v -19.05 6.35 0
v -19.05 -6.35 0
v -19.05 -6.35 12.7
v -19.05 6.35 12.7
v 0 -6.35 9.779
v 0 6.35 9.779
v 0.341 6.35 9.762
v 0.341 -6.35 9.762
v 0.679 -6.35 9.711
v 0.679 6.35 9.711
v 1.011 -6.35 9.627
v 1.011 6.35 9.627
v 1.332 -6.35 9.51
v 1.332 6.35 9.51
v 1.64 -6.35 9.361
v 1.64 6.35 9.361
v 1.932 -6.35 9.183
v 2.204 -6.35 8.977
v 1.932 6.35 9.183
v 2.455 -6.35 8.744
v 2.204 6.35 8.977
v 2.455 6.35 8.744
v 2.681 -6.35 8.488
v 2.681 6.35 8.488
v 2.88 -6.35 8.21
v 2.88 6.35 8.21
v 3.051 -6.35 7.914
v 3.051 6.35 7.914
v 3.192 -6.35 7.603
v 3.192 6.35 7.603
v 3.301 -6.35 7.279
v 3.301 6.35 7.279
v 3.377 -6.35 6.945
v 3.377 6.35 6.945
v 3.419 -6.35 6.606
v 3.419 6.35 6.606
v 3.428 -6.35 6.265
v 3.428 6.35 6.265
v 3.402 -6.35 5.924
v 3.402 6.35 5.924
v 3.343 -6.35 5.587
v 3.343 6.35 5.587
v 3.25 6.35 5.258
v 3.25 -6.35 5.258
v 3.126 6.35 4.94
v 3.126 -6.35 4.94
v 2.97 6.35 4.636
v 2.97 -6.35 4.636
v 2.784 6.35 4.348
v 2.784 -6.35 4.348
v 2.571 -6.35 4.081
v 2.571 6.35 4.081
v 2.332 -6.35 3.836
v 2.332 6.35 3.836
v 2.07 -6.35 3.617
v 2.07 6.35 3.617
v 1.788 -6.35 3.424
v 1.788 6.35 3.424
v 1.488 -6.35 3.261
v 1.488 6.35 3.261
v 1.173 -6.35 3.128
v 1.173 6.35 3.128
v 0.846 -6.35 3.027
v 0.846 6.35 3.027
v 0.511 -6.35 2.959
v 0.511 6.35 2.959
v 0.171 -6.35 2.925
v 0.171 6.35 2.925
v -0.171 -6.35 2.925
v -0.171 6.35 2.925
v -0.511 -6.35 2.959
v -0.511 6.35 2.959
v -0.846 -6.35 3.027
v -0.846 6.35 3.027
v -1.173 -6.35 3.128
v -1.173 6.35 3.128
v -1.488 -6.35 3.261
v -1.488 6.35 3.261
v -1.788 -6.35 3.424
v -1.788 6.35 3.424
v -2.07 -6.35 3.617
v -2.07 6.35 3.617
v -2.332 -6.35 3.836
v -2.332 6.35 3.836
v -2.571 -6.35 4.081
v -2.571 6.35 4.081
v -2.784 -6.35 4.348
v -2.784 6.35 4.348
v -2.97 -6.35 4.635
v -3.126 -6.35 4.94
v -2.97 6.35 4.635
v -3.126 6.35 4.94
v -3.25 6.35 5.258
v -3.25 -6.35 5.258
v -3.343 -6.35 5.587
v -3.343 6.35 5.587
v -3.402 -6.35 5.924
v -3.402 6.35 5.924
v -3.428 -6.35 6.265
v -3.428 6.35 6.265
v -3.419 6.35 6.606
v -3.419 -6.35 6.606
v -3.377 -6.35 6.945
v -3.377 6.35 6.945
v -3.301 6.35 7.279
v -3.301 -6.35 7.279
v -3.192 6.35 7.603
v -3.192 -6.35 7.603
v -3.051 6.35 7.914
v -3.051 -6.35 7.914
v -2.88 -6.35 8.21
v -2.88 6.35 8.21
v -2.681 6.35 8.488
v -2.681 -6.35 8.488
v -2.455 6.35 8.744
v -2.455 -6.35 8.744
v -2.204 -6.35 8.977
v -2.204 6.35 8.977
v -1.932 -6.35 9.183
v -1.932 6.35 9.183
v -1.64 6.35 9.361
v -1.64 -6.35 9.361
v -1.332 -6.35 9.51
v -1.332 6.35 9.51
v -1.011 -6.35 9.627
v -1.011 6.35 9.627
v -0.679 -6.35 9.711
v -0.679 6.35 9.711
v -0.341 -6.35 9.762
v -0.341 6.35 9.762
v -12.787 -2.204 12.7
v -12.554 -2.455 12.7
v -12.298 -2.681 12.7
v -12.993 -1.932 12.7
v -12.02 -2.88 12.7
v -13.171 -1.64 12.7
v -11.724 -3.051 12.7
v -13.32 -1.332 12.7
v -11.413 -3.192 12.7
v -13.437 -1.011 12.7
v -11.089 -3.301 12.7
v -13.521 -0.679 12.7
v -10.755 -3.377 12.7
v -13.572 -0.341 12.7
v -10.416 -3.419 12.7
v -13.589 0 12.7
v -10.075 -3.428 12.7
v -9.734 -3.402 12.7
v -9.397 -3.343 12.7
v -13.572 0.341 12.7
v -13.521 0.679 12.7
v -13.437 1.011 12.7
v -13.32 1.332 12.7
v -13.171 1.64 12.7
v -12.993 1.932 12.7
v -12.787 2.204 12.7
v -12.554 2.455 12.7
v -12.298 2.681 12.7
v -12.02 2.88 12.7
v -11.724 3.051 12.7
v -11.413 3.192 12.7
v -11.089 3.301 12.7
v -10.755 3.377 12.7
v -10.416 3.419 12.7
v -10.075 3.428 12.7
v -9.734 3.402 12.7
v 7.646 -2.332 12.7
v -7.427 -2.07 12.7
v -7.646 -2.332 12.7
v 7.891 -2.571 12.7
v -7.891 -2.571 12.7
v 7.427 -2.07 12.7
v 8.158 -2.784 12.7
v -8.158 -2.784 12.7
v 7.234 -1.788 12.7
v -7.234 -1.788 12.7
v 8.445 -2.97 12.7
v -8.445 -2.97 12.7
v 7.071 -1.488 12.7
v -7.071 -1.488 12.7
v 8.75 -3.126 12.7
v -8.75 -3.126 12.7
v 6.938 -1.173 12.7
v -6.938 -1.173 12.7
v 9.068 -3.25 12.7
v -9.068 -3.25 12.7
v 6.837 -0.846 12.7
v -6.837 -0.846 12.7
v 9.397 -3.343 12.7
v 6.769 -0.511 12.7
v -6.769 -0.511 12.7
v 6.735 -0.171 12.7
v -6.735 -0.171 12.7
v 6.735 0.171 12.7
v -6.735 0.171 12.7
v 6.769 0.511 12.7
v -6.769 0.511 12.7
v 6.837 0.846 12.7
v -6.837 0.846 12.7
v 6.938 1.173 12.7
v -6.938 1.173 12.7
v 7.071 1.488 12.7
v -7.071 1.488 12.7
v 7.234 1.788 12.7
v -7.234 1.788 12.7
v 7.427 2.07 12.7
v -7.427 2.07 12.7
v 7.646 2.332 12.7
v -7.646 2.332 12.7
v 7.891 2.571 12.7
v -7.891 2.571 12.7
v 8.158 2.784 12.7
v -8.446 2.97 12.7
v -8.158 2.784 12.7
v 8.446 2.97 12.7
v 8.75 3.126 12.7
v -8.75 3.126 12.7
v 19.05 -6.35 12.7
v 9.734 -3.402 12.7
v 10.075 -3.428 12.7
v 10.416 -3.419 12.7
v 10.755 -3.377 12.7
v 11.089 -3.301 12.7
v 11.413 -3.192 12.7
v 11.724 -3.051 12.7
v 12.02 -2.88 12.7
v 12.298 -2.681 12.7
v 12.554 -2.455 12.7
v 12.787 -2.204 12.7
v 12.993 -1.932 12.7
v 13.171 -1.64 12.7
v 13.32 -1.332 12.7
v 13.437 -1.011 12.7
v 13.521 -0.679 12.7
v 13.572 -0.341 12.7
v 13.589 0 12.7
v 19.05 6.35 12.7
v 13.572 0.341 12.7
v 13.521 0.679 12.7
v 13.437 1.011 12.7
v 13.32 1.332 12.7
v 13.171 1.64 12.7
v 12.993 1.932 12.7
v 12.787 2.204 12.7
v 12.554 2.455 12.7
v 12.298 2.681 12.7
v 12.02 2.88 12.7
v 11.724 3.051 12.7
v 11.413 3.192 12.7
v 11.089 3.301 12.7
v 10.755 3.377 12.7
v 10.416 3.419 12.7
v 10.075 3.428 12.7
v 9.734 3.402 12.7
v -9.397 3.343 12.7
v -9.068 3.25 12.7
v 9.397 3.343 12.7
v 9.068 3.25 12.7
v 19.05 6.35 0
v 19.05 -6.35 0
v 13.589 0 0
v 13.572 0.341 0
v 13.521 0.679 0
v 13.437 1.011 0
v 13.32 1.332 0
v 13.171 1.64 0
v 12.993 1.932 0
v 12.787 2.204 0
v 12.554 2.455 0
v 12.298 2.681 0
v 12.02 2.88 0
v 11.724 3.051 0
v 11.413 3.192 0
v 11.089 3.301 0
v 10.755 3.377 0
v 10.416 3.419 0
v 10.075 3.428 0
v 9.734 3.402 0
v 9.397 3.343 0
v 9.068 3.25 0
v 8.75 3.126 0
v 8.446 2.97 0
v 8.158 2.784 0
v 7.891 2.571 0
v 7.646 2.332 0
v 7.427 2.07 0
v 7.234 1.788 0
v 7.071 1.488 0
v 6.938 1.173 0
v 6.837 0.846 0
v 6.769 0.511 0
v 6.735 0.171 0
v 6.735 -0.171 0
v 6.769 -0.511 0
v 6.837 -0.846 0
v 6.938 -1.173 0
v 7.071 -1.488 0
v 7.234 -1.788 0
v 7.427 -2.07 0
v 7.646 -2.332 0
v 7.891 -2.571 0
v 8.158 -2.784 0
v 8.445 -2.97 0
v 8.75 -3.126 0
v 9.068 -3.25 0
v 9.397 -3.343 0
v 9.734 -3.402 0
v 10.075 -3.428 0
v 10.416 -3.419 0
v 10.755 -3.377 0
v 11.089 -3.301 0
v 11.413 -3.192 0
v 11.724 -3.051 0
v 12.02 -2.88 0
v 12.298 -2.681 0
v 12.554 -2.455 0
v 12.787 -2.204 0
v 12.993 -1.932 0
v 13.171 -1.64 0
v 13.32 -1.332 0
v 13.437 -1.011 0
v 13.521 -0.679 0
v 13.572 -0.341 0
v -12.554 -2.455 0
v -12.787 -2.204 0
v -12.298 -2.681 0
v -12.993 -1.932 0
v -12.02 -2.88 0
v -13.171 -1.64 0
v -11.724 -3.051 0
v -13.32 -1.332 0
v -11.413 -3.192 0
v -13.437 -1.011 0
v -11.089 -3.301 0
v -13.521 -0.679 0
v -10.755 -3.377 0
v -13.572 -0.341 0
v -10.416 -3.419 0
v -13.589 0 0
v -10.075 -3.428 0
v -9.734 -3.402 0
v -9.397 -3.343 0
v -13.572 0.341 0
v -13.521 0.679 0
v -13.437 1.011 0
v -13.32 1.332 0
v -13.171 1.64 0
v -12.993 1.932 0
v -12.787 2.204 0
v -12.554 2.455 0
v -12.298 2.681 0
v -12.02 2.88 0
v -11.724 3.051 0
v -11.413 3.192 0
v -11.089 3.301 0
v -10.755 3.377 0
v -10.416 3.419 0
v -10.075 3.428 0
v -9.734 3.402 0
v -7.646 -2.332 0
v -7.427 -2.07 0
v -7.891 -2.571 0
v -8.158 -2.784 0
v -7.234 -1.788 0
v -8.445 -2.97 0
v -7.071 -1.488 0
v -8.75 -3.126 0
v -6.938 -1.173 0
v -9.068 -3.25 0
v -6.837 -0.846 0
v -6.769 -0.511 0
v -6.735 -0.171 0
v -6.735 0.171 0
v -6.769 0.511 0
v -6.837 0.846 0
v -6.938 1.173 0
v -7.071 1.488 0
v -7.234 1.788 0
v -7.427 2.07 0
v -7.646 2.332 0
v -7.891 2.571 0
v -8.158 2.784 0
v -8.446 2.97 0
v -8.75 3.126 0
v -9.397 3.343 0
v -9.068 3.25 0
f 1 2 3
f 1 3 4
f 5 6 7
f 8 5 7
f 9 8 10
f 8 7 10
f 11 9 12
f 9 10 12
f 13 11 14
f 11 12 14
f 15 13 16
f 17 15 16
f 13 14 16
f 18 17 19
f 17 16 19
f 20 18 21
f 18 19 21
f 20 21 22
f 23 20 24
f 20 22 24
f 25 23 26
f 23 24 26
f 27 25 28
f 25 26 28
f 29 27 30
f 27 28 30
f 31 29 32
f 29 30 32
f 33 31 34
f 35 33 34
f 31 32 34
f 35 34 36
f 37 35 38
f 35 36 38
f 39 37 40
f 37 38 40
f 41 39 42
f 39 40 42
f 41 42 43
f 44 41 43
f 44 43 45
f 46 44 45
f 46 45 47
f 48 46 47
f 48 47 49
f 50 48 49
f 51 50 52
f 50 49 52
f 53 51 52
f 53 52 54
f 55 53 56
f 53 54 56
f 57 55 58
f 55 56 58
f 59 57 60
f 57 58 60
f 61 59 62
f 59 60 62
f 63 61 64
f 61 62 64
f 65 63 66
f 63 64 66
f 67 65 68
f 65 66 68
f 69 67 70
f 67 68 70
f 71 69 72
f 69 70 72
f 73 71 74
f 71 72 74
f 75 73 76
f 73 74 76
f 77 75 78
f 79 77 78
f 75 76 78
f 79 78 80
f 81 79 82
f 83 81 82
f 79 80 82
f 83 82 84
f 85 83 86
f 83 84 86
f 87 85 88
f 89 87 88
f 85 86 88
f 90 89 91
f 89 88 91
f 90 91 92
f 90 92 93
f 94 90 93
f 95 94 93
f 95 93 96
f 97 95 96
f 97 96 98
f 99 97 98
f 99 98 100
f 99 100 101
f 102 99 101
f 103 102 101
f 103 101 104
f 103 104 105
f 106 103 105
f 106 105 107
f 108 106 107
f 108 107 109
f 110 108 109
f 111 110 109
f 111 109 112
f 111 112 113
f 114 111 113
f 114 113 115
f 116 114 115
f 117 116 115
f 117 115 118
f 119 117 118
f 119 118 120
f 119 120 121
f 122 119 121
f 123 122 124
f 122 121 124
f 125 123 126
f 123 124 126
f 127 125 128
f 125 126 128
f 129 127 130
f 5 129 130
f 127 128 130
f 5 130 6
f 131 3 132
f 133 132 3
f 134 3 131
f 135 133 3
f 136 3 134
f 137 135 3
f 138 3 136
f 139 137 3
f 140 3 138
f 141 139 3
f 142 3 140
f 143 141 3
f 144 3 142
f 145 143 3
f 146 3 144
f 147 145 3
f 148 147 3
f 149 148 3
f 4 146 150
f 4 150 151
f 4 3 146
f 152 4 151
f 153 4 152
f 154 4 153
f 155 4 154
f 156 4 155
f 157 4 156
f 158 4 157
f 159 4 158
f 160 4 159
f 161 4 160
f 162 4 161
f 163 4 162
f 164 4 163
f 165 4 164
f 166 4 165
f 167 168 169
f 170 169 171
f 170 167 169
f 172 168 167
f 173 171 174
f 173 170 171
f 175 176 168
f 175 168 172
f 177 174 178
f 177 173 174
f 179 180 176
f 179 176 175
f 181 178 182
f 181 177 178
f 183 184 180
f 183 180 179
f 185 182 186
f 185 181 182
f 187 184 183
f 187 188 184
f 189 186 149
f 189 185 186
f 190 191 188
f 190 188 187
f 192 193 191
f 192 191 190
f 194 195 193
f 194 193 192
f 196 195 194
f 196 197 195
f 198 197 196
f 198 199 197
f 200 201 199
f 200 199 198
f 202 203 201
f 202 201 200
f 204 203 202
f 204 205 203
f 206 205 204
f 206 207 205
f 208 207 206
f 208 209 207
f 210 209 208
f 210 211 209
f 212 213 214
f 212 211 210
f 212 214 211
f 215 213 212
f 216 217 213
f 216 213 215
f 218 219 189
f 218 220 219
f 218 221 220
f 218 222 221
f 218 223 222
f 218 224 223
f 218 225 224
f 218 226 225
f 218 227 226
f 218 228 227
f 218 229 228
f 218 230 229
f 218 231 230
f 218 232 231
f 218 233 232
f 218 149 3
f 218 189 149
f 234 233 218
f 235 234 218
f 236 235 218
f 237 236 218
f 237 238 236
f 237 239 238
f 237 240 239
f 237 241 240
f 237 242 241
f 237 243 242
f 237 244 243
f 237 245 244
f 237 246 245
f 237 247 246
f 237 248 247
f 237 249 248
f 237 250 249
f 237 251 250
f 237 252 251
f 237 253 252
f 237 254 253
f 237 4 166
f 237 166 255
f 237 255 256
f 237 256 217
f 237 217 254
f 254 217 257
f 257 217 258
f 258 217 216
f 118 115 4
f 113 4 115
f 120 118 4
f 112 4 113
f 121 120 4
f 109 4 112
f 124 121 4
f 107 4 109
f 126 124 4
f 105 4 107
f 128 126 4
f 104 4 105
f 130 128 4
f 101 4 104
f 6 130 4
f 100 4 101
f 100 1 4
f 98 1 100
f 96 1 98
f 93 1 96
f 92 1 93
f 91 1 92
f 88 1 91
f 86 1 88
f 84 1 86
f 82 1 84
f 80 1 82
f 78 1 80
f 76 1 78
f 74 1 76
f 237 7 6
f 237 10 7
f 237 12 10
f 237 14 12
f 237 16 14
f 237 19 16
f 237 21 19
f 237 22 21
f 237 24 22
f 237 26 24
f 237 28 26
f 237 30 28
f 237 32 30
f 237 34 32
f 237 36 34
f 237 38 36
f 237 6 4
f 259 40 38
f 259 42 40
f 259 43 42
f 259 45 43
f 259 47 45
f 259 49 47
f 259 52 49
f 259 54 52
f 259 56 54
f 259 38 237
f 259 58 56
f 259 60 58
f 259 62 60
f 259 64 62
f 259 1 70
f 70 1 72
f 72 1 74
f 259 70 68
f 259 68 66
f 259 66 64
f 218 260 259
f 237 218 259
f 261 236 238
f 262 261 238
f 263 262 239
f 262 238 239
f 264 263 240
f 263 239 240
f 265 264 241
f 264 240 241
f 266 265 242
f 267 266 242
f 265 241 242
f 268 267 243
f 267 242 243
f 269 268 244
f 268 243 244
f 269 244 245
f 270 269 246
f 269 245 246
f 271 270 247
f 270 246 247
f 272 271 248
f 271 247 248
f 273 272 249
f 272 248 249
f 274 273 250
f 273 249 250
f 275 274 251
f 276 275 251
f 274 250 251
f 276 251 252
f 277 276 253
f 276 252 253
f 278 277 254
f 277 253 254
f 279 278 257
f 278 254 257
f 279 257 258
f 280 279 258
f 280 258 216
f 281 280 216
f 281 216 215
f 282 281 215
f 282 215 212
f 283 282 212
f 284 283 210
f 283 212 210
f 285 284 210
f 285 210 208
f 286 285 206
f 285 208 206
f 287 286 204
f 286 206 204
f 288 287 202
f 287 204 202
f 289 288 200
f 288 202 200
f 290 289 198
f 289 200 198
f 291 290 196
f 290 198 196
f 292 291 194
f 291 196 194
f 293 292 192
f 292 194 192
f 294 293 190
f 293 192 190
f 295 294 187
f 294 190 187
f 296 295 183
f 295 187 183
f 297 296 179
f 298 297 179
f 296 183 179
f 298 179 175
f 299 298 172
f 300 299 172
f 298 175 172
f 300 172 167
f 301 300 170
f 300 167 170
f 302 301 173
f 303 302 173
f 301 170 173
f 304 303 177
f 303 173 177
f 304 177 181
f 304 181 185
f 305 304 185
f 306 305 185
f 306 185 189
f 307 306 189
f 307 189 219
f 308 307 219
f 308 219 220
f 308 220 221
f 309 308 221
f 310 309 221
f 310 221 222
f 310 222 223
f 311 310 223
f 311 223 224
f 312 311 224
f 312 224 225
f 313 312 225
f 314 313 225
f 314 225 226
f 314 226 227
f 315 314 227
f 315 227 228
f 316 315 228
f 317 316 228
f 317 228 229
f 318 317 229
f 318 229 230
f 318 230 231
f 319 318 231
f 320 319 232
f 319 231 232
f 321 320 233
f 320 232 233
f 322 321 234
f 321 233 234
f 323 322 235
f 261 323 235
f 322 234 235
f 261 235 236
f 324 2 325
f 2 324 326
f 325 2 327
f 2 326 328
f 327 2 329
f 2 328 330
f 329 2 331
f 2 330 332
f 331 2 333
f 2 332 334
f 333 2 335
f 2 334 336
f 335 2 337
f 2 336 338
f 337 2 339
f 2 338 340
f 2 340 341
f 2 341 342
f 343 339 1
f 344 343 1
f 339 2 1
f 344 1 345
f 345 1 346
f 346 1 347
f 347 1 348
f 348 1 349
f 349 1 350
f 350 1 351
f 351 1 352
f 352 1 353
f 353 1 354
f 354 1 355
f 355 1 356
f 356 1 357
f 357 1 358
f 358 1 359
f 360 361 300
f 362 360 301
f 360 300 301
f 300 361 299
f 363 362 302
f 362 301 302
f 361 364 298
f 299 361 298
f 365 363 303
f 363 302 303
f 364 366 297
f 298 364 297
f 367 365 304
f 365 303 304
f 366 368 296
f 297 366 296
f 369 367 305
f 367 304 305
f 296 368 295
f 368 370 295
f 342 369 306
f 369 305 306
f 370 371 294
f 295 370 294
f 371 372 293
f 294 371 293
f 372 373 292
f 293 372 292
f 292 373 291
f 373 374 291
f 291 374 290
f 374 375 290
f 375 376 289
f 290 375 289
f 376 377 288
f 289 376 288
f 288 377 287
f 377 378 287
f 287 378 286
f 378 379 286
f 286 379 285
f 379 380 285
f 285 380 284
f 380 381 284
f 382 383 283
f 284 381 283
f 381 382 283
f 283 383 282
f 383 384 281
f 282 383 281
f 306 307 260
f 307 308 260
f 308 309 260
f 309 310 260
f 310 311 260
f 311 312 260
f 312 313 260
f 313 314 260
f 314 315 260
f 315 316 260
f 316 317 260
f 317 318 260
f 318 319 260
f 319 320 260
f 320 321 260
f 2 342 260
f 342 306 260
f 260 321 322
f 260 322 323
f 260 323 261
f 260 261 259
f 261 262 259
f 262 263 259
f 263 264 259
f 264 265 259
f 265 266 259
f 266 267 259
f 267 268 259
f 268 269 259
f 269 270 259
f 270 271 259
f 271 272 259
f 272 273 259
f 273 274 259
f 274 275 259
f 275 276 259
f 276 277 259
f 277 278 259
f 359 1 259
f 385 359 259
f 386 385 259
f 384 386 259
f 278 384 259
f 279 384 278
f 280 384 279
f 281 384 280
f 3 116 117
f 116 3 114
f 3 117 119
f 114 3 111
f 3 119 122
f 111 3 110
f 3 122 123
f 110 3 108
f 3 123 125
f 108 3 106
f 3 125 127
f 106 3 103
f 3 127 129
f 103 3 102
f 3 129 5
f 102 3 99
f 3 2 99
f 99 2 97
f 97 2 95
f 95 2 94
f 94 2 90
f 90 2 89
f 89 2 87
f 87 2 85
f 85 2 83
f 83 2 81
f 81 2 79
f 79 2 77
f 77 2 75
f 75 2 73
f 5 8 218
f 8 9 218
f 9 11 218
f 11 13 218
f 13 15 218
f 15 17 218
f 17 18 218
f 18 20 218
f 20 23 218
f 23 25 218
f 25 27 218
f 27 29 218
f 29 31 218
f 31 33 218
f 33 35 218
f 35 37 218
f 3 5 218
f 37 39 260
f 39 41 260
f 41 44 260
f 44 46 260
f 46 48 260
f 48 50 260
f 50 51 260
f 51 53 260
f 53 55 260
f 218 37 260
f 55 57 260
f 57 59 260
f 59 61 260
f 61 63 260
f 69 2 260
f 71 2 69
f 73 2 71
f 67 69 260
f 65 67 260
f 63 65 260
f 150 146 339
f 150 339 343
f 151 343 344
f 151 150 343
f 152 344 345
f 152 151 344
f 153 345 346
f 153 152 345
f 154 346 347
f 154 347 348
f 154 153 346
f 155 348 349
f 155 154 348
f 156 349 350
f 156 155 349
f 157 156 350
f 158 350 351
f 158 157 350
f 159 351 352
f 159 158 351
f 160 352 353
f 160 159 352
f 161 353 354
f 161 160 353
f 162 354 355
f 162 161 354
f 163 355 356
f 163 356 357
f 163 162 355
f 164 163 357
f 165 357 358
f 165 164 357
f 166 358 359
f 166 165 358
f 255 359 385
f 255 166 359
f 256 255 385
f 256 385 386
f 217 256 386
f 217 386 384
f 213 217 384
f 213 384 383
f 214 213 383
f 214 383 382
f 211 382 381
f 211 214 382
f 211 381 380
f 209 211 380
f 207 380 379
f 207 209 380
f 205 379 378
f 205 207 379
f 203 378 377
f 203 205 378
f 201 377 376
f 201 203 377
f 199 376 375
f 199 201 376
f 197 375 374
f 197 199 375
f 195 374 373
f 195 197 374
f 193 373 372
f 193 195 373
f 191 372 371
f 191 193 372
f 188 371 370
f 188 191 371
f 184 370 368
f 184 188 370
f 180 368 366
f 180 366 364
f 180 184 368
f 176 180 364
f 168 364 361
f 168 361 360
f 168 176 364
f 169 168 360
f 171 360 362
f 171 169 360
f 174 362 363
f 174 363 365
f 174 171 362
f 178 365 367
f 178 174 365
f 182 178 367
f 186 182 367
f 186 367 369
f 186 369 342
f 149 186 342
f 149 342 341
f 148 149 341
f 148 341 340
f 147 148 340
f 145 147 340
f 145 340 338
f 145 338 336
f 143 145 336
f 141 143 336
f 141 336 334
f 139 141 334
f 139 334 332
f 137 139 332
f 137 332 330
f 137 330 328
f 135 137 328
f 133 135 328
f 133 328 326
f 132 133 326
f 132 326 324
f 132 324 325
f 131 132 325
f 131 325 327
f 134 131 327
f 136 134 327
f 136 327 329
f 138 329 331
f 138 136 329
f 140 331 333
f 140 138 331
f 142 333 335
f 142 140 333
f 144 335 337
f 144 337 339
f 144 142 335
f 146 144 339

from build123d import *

# Parameters (mm, degrees)
SKETCH1_W           = 38.1
SKETCH1_H           = 12.7
BOSS_EXTRUDE1_DEPTH = 12.7
SKETCH2_R           = 3.429
CUT_EXTRUDE1_DEPTH  = 12.7
SKETCH3_R           = 3.429
CUT_EXTRUDE2_DEPTH  = 12.7


with BuildPart() as part:
    # Sketch1 → Boss-Extrude1 (new body)
    with BuildSketch(Plane.XY):
        Rectangle(SKETCH1_W, SKETCH1_H)
    extrude(amount=BOSS_EXTRUDE1_DEPTH)

    # Sketch2 → Cut-Extrude1 (cut)
    with BuildSketch(Plane.XY.offset(12.7)):
        with Locations((10.16, 0)):
            Circle(SKETCH2_R)
    cut_extrude1 = extrude(amount=-CUT_EXTRUDE1_DEPTH, mode=Mode.SUBTRACT)

    # Sketch3 → Cut-Extrude2 (cut)
    with BuildSketch(Plane(origin=(0, 6.35, 0), x_dir=(1, 0, 0), z_dir=(0, 1, 0))):
        with Locations(Location((0, -6.35, 0), (0, 0, 270))):
            Circle(SKETCH3_R)
    extrude(amount=-CUT_EXTRUDE2_DEPTH, mode=Mode.SUBTRACT)

    # Mirror1: Cut-Extrude1 across plane
    add(cut_extrude1.mirror(Plane(origin=(0, 0, 0), x_dir=(0, 0, 1), z_dir=(1, 0, 0))), mode=Mode.SUBTRACT)


solid = part.part
